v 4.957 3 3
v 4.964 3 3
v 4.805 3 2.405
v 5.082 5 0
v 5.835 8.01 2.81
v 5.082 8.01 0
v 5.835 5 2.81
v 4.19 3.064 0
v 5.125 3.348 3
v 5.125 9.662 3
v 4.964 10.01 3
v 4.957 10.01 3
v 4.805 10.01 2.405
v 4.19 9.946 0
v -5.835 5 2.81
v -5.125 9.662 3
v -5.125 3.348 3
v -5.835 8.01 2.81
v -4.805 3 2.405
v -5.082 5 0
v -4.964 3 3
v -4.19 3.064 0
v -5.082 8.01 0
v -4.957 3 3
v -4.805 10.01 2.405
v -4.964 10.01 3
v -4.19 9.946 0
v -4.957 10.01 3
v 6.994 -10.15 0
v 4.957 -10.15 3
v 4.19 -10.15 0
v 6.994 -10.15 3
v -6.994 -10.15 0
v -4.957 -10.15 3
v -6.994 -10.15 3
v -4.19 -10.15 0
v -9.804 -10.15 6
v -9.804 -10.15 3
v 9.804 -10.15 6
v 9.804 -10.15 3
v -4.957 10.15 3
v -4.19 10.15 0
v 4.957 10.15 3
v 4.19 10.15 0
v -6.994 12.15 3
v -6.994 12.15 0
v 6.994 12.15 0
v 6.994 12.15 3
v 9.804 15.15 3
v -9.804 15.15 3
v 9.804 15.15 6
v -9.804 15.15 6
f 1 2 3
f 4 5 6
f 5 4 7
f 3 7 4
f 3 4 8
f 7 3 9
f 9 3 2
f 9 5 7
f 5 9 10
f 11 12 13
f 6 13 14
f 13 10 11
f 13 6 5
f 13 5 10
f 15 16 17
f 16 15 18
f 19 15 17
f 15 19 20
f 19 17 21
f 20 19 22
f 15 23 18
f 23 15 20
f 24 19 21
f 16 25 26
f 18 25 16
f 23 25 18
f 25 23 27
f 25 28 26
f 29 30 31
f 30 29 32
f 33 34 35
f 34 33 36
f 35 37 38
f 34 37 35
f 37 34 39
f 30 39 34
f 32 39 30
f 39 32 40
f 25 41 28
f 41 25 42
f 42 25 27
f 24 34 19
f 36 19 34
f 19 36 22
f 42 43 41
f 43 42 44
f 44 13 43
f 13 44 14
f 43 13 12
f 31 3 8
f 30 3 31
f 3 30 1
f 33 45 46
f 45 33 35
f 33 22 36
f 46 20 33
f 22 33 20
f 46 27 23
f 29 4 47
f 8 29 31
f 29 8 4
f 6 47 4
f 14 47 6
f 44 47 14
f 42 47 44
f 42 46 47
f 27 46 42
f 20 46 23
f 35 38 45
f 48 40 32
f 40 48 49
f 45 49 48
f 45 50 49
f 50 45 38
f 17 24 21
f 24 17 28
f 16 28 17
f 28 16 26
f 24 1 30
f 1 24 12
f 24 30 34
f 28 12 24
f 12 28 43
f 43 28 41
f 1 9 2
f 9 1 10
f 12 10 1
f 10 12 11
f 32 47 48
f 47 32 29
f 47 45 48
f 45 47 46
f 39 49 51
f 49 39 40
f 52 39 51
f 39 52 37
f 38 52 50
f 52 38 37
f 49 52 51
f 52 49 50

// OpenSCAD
// file: female_dovetail.scad
// Female Dovetail with Integrated Boss and Inner Catch Recesses
// Creates a rectangular boss with trapezoidal channel cut into it
// Catch recesses in INNER channel walls for snap-fit latch
// Uses hull() approach for intuitive geometry definition
// Per SPEC.md Section 9.5

include <dimensions.scad>

function dovetail_top_width(base_width, height, angle) =
    base_width + 2 * height * tan(angle);

// Female dovetail - boss with channel cut into it
// Origin at center of boss top surface (where it attaches to panel)
// Boss extends in -Z direction, channel opens toward -Z
//
// The hull() approach connects two rectangles at different Z positions:
// - Narrow rectangle at Z=0 (panel surface, where male locks in)
// - Wide rectangle at Z=-height (entry point for male dovetail)
//
module female_dovetail(
    length = scaled_dovetail_length,
    height = scaled_dovetail_height,
    base_width = scaled_dovetail_base_width,
    angle = dovetail_angle,
    clearance = scaled_clearance,
    margin = scaled_boss_margin,
    // Catch recess parameters
    with_catch_windows = true,
    catch_height = scaled_catch_height,
    catch_length = scaled_catch_length,
    ramp_length = scaled_catch_ramp_length,
    window_clearance = scaled_window_clearance
) {
    // Channel dimensions with clearance
    narrow_width = base_width + 2 * clearance;      // at Z=0 (top)
    wide_width = dovetail_top_width(narrow_width, height + clearance, angle);  // at Z=-height (bottom)
    channel_length = length + 2 * clearance;

    // Boss dimensions
    boss_width = wide_width + 2 * margin;
    boss_depth = channel_length + margin;
    boss_height = height;

    // Recess dimensions (sized for catch bump + clearance)
    recess_depth = catch_height + window_clearance;  // How far into wall at plateau

    // Y positions for ramped recess sections (matching male catch)
    // Male catch positioned so exit ramp ends at length/2
    recess_y_start = length/2 - 2 * ramp_length - catch_length;

    // Section boundaries
    entry_ramp_end = recess_y_start + ramp_length;
    plateau_end = entry_ramp_end + catch_length;
    exit_ramp_end = plateau_end + ramp_length;  // = length/2

    rotate([0, 180, 0])
    difference() {
        // Rectangular boss extending in -Z
        translate([-boss_width/2, -channel_length/2, -boss_height])
            cube([boss_width, boss_depth, boss_height]);

        // Channel + recesses as single union (same coordinate system)
        union() {
            // Trapezoidal channel via hull of two thin cubes
            hull() {
                // Narrow rectangle at top (Z=0), extends slightly above for clean cut
                translate([0, 0, clearance])
                    cube([narrow_width, channel_length, 0.01], center=true);

                // Wide rectangle at bottom (Z=-height)
                translate([0, 0, -height - clearance])
                    cube([wide_width, channel_length, 0.01], center=true);
            }

            // Inner channel recesses - ramped to match male catch profile
            // Rotated to follow the sloped channel walls
            if (with_catch_windows) {
                // Left recess (negative X side) - rotate to follow wall slope
                translate([-narrow_width/2, 0, 0])
                rotate([0, angle, 0])
                translate([narrow_width/2, 0, 0])
                union() {
                    // Entry ramp (0 -> full depth)
                    hull() {
                        translate([-narrow_width/2 - 0.01, recess_y_start, -height - clearance])
                            cube([0.02, 0.01, height + 2*clearance]);
                        translate([-narrow_width/2 - recess_depth, entry_ramp_end, -height - clearance])
                            cube([recess_depth, 0.01, height + 2*clearance]);
                    }
                    // Plateau (full depth)
                    translate([-narrow_width/2 - recess_depth, entry_ramp_end, -height - clearance])
                        cube([recess_depth, catch_length, height + 2*clearance]);
                    // Exit ramp (full depth -> 0)
                    hull() {
                        translate([-narrow_width/2 - recess_depth, plateau_end, -height - clearance])
                            cube([recess_depth, 0.01, height + 2*clearance]);
                        translate([-narrow_width/2 - 0.01, exit_ramp_end, -height - clearance])
                            cube([0.02, 0.01, height + 2*clearance]);
                    }
                }

                // Right recess (positive X side) - rotate to follow wall slope
                translate([narrow_width/2, 0, 0])
                rotate([0, -angle, 0])
                translate([-narrow_width/2, 0, 0])
                union() {
                    // Entry ramp (0 -> full depth)
                    hull() {
                        translate([narrow_width/2 - 0.01, recess_y_start, -height - clearance])
                            cube([0.02, 0.01, height + 2*clearance]);
                        translate([narrow_width/2, entry_ramp_end, -height - clearance])
                            cube([recess_depth, 0.01, height + 2*clearance]);
                    }
                    // Plateau (full depth)
                    translate([narrow_width/2, entry_ramp_end, -height - clearance])
                        cube([recess_depth, catch_length, height + 2*clearance]);
                    // Exit ramp (full depth -> 0)
                    hull() {
                        translate([narrow_width/2, plateau_end, -height - clearance])
                            cube([recess_depth, 0.01, height + 2*clearance]);
                        translate([narrow_width/2 - 0.01, exit_ramp_end, -height - clearance])
                            cube([0.02, 0.01, height + 2*clearance]);
                    }
                }
            }
        }
    }
}
// file: dimensions.scad
// Dovetail Joint Dimensions
// Shared parameters for male and female dovetail modules
// Per SPEC.md Section 9.3-9.5

// Dovetail geometry parameters
dovetail_angle = 15;              // Angle from vertical (degrees)
dovetail_height = 3;              // Trapezoid height / engagement depth (mm)
dovetail_length = 20;             // Length along panel edge (mm)
dovetail_base_width = 8;          // Width at narrow end (mm)
dovetail_clearance = 0.15;        // Clearance per side (mm) - FDM tuned

// Boss parameters (raised sections for female dovetails)
dovetail_boss_margin = 2;         // Extra wall around dovetail channel

// Center-slot latch parameters (integrated snap-fit retention)
center_slot_width = 3;            // Flex gap width (mm)
center_slot_end_margin = 6;       // Solid material at base end of slot (mm)

// Catch bump parameters (ramped profile on outer dovetail faces)
catch_bump_height = 0.8;          // Protrusion from dovetail surface (mm)
catch_bump_length = 3;            // Plateau length along insertion direction (mm)
catch_ramp_length = 2;            // Entry/exit ramp length (mm)

// Female window parameters
window_clearance = 0.10;          // Clearance around catch in recess (mm) - tightened for less play

// Scale factor for prototyping (1.0 = actual size)
dovetail_scale_factor = 1.0;

// Scaled dimensions (computed)
scaled_dovetail_height = dovetail_height * dovetail_scale_factor;
scaled_dovetail_length = dovetail_length * dovetail_scale_factor;
scaled_dovetail_base_width = dovetail_base_width * dovetail_scale_factor;
scaled_clearance = dovetail_clearance * dovetail_scale_factor;
scaled_boss_margin = dovetail_boss_margin * dovetail_scale_factor;
scaled_slot_width = center_slot_width * dovetail_scale_factor;
scaled_slot_end_margin = center_slot_end_margin * dovetail_scale_factor;
scaled_catch_height = catch_bump_height * dovetail_scale_factor;
scaled_catch_length = catch_bump_length * dovetail_scale_factor;
scaled_catch_ramp_length = catch_ramp_length * dovetail_scale_factor;
scaled_window_clearance = window_clearance * dovetail_scale_factor;
// main file
// Female Dovetail Bottom Shelf
// Creates a bottom support shelf for a female dovetail mounted on a panel edge
//
// The shelf provides:
// - Support underneath the dovetail on the interior side of the panel
// - Matches the dovetail boss depth
//
// Per SPEC.md Section 9.6 - External user-accessible release points

include <dimensions.scad>
use <female_dovetail.scad>

// Calculate dovetail top width (widest part of trapezoid)
function calc_dovetail_top_width() =
    dovetail_base_width + 2 * dovetail_height * tan(dovetail_angle);

// Female dovetail with bottom shelf module
// Creates a female dovetail with a support shelf underneath
//
// Origin: At the center of the dovetail (matching female_dovetail origin placement)
// Shelf extends in +X direction (into case interior)
//
// Parameters:
//   thickness - Depth of shelf into case (default: dovetail_height)
//   wall - Height of the shelf wall (default: dovetail_height)
//   with_catch_windows - Pass through to female_dovetail
//
module female_dovetail_pocket(
    thickness = dovetail_height,                  // 3mm - depth into case
    wall = dovetail_height,                       // 3mm - shelf wall height (standard panel width)
    with_catch_windows = true
) {
    // Boss dimensions (matches female_dovetail boss exactly)
    boss_width = calc_dovetail_top_width() + 2 * dovetail_boss_margin;  // ~13.6mm
    channel_length = dovetail_length + 2 * dovetail_clearance;          // ~20.3mm
    boss_depth = channel_length + dovetail_boss_margin;                 // ~22.3mm (margin on closed side only)

    // Shelf covers entire dovetail + standard panel width on closed side
    shelf_depth = boss_depth + wall;

    union() {
        // The female dovetail itself
        female_dovetail(with_catch_windows = with_catch_windows);

        // Top shelf - attached to top of dovetail boss, covers full depth + panel width
        // Width extends wall thickness beyond dovetail on each side
        // Flush with opening at -Y, extends wall thickness on closed side at +Y
        shelf_width = boss_width + 2 * wall;
        translate([-shelf_width/2, -channel_length/2, dovetail_height])
            cube([shelf_width, shelf_depth, wall]);
    }
}

// Preview
female_dovetail_pocket();
